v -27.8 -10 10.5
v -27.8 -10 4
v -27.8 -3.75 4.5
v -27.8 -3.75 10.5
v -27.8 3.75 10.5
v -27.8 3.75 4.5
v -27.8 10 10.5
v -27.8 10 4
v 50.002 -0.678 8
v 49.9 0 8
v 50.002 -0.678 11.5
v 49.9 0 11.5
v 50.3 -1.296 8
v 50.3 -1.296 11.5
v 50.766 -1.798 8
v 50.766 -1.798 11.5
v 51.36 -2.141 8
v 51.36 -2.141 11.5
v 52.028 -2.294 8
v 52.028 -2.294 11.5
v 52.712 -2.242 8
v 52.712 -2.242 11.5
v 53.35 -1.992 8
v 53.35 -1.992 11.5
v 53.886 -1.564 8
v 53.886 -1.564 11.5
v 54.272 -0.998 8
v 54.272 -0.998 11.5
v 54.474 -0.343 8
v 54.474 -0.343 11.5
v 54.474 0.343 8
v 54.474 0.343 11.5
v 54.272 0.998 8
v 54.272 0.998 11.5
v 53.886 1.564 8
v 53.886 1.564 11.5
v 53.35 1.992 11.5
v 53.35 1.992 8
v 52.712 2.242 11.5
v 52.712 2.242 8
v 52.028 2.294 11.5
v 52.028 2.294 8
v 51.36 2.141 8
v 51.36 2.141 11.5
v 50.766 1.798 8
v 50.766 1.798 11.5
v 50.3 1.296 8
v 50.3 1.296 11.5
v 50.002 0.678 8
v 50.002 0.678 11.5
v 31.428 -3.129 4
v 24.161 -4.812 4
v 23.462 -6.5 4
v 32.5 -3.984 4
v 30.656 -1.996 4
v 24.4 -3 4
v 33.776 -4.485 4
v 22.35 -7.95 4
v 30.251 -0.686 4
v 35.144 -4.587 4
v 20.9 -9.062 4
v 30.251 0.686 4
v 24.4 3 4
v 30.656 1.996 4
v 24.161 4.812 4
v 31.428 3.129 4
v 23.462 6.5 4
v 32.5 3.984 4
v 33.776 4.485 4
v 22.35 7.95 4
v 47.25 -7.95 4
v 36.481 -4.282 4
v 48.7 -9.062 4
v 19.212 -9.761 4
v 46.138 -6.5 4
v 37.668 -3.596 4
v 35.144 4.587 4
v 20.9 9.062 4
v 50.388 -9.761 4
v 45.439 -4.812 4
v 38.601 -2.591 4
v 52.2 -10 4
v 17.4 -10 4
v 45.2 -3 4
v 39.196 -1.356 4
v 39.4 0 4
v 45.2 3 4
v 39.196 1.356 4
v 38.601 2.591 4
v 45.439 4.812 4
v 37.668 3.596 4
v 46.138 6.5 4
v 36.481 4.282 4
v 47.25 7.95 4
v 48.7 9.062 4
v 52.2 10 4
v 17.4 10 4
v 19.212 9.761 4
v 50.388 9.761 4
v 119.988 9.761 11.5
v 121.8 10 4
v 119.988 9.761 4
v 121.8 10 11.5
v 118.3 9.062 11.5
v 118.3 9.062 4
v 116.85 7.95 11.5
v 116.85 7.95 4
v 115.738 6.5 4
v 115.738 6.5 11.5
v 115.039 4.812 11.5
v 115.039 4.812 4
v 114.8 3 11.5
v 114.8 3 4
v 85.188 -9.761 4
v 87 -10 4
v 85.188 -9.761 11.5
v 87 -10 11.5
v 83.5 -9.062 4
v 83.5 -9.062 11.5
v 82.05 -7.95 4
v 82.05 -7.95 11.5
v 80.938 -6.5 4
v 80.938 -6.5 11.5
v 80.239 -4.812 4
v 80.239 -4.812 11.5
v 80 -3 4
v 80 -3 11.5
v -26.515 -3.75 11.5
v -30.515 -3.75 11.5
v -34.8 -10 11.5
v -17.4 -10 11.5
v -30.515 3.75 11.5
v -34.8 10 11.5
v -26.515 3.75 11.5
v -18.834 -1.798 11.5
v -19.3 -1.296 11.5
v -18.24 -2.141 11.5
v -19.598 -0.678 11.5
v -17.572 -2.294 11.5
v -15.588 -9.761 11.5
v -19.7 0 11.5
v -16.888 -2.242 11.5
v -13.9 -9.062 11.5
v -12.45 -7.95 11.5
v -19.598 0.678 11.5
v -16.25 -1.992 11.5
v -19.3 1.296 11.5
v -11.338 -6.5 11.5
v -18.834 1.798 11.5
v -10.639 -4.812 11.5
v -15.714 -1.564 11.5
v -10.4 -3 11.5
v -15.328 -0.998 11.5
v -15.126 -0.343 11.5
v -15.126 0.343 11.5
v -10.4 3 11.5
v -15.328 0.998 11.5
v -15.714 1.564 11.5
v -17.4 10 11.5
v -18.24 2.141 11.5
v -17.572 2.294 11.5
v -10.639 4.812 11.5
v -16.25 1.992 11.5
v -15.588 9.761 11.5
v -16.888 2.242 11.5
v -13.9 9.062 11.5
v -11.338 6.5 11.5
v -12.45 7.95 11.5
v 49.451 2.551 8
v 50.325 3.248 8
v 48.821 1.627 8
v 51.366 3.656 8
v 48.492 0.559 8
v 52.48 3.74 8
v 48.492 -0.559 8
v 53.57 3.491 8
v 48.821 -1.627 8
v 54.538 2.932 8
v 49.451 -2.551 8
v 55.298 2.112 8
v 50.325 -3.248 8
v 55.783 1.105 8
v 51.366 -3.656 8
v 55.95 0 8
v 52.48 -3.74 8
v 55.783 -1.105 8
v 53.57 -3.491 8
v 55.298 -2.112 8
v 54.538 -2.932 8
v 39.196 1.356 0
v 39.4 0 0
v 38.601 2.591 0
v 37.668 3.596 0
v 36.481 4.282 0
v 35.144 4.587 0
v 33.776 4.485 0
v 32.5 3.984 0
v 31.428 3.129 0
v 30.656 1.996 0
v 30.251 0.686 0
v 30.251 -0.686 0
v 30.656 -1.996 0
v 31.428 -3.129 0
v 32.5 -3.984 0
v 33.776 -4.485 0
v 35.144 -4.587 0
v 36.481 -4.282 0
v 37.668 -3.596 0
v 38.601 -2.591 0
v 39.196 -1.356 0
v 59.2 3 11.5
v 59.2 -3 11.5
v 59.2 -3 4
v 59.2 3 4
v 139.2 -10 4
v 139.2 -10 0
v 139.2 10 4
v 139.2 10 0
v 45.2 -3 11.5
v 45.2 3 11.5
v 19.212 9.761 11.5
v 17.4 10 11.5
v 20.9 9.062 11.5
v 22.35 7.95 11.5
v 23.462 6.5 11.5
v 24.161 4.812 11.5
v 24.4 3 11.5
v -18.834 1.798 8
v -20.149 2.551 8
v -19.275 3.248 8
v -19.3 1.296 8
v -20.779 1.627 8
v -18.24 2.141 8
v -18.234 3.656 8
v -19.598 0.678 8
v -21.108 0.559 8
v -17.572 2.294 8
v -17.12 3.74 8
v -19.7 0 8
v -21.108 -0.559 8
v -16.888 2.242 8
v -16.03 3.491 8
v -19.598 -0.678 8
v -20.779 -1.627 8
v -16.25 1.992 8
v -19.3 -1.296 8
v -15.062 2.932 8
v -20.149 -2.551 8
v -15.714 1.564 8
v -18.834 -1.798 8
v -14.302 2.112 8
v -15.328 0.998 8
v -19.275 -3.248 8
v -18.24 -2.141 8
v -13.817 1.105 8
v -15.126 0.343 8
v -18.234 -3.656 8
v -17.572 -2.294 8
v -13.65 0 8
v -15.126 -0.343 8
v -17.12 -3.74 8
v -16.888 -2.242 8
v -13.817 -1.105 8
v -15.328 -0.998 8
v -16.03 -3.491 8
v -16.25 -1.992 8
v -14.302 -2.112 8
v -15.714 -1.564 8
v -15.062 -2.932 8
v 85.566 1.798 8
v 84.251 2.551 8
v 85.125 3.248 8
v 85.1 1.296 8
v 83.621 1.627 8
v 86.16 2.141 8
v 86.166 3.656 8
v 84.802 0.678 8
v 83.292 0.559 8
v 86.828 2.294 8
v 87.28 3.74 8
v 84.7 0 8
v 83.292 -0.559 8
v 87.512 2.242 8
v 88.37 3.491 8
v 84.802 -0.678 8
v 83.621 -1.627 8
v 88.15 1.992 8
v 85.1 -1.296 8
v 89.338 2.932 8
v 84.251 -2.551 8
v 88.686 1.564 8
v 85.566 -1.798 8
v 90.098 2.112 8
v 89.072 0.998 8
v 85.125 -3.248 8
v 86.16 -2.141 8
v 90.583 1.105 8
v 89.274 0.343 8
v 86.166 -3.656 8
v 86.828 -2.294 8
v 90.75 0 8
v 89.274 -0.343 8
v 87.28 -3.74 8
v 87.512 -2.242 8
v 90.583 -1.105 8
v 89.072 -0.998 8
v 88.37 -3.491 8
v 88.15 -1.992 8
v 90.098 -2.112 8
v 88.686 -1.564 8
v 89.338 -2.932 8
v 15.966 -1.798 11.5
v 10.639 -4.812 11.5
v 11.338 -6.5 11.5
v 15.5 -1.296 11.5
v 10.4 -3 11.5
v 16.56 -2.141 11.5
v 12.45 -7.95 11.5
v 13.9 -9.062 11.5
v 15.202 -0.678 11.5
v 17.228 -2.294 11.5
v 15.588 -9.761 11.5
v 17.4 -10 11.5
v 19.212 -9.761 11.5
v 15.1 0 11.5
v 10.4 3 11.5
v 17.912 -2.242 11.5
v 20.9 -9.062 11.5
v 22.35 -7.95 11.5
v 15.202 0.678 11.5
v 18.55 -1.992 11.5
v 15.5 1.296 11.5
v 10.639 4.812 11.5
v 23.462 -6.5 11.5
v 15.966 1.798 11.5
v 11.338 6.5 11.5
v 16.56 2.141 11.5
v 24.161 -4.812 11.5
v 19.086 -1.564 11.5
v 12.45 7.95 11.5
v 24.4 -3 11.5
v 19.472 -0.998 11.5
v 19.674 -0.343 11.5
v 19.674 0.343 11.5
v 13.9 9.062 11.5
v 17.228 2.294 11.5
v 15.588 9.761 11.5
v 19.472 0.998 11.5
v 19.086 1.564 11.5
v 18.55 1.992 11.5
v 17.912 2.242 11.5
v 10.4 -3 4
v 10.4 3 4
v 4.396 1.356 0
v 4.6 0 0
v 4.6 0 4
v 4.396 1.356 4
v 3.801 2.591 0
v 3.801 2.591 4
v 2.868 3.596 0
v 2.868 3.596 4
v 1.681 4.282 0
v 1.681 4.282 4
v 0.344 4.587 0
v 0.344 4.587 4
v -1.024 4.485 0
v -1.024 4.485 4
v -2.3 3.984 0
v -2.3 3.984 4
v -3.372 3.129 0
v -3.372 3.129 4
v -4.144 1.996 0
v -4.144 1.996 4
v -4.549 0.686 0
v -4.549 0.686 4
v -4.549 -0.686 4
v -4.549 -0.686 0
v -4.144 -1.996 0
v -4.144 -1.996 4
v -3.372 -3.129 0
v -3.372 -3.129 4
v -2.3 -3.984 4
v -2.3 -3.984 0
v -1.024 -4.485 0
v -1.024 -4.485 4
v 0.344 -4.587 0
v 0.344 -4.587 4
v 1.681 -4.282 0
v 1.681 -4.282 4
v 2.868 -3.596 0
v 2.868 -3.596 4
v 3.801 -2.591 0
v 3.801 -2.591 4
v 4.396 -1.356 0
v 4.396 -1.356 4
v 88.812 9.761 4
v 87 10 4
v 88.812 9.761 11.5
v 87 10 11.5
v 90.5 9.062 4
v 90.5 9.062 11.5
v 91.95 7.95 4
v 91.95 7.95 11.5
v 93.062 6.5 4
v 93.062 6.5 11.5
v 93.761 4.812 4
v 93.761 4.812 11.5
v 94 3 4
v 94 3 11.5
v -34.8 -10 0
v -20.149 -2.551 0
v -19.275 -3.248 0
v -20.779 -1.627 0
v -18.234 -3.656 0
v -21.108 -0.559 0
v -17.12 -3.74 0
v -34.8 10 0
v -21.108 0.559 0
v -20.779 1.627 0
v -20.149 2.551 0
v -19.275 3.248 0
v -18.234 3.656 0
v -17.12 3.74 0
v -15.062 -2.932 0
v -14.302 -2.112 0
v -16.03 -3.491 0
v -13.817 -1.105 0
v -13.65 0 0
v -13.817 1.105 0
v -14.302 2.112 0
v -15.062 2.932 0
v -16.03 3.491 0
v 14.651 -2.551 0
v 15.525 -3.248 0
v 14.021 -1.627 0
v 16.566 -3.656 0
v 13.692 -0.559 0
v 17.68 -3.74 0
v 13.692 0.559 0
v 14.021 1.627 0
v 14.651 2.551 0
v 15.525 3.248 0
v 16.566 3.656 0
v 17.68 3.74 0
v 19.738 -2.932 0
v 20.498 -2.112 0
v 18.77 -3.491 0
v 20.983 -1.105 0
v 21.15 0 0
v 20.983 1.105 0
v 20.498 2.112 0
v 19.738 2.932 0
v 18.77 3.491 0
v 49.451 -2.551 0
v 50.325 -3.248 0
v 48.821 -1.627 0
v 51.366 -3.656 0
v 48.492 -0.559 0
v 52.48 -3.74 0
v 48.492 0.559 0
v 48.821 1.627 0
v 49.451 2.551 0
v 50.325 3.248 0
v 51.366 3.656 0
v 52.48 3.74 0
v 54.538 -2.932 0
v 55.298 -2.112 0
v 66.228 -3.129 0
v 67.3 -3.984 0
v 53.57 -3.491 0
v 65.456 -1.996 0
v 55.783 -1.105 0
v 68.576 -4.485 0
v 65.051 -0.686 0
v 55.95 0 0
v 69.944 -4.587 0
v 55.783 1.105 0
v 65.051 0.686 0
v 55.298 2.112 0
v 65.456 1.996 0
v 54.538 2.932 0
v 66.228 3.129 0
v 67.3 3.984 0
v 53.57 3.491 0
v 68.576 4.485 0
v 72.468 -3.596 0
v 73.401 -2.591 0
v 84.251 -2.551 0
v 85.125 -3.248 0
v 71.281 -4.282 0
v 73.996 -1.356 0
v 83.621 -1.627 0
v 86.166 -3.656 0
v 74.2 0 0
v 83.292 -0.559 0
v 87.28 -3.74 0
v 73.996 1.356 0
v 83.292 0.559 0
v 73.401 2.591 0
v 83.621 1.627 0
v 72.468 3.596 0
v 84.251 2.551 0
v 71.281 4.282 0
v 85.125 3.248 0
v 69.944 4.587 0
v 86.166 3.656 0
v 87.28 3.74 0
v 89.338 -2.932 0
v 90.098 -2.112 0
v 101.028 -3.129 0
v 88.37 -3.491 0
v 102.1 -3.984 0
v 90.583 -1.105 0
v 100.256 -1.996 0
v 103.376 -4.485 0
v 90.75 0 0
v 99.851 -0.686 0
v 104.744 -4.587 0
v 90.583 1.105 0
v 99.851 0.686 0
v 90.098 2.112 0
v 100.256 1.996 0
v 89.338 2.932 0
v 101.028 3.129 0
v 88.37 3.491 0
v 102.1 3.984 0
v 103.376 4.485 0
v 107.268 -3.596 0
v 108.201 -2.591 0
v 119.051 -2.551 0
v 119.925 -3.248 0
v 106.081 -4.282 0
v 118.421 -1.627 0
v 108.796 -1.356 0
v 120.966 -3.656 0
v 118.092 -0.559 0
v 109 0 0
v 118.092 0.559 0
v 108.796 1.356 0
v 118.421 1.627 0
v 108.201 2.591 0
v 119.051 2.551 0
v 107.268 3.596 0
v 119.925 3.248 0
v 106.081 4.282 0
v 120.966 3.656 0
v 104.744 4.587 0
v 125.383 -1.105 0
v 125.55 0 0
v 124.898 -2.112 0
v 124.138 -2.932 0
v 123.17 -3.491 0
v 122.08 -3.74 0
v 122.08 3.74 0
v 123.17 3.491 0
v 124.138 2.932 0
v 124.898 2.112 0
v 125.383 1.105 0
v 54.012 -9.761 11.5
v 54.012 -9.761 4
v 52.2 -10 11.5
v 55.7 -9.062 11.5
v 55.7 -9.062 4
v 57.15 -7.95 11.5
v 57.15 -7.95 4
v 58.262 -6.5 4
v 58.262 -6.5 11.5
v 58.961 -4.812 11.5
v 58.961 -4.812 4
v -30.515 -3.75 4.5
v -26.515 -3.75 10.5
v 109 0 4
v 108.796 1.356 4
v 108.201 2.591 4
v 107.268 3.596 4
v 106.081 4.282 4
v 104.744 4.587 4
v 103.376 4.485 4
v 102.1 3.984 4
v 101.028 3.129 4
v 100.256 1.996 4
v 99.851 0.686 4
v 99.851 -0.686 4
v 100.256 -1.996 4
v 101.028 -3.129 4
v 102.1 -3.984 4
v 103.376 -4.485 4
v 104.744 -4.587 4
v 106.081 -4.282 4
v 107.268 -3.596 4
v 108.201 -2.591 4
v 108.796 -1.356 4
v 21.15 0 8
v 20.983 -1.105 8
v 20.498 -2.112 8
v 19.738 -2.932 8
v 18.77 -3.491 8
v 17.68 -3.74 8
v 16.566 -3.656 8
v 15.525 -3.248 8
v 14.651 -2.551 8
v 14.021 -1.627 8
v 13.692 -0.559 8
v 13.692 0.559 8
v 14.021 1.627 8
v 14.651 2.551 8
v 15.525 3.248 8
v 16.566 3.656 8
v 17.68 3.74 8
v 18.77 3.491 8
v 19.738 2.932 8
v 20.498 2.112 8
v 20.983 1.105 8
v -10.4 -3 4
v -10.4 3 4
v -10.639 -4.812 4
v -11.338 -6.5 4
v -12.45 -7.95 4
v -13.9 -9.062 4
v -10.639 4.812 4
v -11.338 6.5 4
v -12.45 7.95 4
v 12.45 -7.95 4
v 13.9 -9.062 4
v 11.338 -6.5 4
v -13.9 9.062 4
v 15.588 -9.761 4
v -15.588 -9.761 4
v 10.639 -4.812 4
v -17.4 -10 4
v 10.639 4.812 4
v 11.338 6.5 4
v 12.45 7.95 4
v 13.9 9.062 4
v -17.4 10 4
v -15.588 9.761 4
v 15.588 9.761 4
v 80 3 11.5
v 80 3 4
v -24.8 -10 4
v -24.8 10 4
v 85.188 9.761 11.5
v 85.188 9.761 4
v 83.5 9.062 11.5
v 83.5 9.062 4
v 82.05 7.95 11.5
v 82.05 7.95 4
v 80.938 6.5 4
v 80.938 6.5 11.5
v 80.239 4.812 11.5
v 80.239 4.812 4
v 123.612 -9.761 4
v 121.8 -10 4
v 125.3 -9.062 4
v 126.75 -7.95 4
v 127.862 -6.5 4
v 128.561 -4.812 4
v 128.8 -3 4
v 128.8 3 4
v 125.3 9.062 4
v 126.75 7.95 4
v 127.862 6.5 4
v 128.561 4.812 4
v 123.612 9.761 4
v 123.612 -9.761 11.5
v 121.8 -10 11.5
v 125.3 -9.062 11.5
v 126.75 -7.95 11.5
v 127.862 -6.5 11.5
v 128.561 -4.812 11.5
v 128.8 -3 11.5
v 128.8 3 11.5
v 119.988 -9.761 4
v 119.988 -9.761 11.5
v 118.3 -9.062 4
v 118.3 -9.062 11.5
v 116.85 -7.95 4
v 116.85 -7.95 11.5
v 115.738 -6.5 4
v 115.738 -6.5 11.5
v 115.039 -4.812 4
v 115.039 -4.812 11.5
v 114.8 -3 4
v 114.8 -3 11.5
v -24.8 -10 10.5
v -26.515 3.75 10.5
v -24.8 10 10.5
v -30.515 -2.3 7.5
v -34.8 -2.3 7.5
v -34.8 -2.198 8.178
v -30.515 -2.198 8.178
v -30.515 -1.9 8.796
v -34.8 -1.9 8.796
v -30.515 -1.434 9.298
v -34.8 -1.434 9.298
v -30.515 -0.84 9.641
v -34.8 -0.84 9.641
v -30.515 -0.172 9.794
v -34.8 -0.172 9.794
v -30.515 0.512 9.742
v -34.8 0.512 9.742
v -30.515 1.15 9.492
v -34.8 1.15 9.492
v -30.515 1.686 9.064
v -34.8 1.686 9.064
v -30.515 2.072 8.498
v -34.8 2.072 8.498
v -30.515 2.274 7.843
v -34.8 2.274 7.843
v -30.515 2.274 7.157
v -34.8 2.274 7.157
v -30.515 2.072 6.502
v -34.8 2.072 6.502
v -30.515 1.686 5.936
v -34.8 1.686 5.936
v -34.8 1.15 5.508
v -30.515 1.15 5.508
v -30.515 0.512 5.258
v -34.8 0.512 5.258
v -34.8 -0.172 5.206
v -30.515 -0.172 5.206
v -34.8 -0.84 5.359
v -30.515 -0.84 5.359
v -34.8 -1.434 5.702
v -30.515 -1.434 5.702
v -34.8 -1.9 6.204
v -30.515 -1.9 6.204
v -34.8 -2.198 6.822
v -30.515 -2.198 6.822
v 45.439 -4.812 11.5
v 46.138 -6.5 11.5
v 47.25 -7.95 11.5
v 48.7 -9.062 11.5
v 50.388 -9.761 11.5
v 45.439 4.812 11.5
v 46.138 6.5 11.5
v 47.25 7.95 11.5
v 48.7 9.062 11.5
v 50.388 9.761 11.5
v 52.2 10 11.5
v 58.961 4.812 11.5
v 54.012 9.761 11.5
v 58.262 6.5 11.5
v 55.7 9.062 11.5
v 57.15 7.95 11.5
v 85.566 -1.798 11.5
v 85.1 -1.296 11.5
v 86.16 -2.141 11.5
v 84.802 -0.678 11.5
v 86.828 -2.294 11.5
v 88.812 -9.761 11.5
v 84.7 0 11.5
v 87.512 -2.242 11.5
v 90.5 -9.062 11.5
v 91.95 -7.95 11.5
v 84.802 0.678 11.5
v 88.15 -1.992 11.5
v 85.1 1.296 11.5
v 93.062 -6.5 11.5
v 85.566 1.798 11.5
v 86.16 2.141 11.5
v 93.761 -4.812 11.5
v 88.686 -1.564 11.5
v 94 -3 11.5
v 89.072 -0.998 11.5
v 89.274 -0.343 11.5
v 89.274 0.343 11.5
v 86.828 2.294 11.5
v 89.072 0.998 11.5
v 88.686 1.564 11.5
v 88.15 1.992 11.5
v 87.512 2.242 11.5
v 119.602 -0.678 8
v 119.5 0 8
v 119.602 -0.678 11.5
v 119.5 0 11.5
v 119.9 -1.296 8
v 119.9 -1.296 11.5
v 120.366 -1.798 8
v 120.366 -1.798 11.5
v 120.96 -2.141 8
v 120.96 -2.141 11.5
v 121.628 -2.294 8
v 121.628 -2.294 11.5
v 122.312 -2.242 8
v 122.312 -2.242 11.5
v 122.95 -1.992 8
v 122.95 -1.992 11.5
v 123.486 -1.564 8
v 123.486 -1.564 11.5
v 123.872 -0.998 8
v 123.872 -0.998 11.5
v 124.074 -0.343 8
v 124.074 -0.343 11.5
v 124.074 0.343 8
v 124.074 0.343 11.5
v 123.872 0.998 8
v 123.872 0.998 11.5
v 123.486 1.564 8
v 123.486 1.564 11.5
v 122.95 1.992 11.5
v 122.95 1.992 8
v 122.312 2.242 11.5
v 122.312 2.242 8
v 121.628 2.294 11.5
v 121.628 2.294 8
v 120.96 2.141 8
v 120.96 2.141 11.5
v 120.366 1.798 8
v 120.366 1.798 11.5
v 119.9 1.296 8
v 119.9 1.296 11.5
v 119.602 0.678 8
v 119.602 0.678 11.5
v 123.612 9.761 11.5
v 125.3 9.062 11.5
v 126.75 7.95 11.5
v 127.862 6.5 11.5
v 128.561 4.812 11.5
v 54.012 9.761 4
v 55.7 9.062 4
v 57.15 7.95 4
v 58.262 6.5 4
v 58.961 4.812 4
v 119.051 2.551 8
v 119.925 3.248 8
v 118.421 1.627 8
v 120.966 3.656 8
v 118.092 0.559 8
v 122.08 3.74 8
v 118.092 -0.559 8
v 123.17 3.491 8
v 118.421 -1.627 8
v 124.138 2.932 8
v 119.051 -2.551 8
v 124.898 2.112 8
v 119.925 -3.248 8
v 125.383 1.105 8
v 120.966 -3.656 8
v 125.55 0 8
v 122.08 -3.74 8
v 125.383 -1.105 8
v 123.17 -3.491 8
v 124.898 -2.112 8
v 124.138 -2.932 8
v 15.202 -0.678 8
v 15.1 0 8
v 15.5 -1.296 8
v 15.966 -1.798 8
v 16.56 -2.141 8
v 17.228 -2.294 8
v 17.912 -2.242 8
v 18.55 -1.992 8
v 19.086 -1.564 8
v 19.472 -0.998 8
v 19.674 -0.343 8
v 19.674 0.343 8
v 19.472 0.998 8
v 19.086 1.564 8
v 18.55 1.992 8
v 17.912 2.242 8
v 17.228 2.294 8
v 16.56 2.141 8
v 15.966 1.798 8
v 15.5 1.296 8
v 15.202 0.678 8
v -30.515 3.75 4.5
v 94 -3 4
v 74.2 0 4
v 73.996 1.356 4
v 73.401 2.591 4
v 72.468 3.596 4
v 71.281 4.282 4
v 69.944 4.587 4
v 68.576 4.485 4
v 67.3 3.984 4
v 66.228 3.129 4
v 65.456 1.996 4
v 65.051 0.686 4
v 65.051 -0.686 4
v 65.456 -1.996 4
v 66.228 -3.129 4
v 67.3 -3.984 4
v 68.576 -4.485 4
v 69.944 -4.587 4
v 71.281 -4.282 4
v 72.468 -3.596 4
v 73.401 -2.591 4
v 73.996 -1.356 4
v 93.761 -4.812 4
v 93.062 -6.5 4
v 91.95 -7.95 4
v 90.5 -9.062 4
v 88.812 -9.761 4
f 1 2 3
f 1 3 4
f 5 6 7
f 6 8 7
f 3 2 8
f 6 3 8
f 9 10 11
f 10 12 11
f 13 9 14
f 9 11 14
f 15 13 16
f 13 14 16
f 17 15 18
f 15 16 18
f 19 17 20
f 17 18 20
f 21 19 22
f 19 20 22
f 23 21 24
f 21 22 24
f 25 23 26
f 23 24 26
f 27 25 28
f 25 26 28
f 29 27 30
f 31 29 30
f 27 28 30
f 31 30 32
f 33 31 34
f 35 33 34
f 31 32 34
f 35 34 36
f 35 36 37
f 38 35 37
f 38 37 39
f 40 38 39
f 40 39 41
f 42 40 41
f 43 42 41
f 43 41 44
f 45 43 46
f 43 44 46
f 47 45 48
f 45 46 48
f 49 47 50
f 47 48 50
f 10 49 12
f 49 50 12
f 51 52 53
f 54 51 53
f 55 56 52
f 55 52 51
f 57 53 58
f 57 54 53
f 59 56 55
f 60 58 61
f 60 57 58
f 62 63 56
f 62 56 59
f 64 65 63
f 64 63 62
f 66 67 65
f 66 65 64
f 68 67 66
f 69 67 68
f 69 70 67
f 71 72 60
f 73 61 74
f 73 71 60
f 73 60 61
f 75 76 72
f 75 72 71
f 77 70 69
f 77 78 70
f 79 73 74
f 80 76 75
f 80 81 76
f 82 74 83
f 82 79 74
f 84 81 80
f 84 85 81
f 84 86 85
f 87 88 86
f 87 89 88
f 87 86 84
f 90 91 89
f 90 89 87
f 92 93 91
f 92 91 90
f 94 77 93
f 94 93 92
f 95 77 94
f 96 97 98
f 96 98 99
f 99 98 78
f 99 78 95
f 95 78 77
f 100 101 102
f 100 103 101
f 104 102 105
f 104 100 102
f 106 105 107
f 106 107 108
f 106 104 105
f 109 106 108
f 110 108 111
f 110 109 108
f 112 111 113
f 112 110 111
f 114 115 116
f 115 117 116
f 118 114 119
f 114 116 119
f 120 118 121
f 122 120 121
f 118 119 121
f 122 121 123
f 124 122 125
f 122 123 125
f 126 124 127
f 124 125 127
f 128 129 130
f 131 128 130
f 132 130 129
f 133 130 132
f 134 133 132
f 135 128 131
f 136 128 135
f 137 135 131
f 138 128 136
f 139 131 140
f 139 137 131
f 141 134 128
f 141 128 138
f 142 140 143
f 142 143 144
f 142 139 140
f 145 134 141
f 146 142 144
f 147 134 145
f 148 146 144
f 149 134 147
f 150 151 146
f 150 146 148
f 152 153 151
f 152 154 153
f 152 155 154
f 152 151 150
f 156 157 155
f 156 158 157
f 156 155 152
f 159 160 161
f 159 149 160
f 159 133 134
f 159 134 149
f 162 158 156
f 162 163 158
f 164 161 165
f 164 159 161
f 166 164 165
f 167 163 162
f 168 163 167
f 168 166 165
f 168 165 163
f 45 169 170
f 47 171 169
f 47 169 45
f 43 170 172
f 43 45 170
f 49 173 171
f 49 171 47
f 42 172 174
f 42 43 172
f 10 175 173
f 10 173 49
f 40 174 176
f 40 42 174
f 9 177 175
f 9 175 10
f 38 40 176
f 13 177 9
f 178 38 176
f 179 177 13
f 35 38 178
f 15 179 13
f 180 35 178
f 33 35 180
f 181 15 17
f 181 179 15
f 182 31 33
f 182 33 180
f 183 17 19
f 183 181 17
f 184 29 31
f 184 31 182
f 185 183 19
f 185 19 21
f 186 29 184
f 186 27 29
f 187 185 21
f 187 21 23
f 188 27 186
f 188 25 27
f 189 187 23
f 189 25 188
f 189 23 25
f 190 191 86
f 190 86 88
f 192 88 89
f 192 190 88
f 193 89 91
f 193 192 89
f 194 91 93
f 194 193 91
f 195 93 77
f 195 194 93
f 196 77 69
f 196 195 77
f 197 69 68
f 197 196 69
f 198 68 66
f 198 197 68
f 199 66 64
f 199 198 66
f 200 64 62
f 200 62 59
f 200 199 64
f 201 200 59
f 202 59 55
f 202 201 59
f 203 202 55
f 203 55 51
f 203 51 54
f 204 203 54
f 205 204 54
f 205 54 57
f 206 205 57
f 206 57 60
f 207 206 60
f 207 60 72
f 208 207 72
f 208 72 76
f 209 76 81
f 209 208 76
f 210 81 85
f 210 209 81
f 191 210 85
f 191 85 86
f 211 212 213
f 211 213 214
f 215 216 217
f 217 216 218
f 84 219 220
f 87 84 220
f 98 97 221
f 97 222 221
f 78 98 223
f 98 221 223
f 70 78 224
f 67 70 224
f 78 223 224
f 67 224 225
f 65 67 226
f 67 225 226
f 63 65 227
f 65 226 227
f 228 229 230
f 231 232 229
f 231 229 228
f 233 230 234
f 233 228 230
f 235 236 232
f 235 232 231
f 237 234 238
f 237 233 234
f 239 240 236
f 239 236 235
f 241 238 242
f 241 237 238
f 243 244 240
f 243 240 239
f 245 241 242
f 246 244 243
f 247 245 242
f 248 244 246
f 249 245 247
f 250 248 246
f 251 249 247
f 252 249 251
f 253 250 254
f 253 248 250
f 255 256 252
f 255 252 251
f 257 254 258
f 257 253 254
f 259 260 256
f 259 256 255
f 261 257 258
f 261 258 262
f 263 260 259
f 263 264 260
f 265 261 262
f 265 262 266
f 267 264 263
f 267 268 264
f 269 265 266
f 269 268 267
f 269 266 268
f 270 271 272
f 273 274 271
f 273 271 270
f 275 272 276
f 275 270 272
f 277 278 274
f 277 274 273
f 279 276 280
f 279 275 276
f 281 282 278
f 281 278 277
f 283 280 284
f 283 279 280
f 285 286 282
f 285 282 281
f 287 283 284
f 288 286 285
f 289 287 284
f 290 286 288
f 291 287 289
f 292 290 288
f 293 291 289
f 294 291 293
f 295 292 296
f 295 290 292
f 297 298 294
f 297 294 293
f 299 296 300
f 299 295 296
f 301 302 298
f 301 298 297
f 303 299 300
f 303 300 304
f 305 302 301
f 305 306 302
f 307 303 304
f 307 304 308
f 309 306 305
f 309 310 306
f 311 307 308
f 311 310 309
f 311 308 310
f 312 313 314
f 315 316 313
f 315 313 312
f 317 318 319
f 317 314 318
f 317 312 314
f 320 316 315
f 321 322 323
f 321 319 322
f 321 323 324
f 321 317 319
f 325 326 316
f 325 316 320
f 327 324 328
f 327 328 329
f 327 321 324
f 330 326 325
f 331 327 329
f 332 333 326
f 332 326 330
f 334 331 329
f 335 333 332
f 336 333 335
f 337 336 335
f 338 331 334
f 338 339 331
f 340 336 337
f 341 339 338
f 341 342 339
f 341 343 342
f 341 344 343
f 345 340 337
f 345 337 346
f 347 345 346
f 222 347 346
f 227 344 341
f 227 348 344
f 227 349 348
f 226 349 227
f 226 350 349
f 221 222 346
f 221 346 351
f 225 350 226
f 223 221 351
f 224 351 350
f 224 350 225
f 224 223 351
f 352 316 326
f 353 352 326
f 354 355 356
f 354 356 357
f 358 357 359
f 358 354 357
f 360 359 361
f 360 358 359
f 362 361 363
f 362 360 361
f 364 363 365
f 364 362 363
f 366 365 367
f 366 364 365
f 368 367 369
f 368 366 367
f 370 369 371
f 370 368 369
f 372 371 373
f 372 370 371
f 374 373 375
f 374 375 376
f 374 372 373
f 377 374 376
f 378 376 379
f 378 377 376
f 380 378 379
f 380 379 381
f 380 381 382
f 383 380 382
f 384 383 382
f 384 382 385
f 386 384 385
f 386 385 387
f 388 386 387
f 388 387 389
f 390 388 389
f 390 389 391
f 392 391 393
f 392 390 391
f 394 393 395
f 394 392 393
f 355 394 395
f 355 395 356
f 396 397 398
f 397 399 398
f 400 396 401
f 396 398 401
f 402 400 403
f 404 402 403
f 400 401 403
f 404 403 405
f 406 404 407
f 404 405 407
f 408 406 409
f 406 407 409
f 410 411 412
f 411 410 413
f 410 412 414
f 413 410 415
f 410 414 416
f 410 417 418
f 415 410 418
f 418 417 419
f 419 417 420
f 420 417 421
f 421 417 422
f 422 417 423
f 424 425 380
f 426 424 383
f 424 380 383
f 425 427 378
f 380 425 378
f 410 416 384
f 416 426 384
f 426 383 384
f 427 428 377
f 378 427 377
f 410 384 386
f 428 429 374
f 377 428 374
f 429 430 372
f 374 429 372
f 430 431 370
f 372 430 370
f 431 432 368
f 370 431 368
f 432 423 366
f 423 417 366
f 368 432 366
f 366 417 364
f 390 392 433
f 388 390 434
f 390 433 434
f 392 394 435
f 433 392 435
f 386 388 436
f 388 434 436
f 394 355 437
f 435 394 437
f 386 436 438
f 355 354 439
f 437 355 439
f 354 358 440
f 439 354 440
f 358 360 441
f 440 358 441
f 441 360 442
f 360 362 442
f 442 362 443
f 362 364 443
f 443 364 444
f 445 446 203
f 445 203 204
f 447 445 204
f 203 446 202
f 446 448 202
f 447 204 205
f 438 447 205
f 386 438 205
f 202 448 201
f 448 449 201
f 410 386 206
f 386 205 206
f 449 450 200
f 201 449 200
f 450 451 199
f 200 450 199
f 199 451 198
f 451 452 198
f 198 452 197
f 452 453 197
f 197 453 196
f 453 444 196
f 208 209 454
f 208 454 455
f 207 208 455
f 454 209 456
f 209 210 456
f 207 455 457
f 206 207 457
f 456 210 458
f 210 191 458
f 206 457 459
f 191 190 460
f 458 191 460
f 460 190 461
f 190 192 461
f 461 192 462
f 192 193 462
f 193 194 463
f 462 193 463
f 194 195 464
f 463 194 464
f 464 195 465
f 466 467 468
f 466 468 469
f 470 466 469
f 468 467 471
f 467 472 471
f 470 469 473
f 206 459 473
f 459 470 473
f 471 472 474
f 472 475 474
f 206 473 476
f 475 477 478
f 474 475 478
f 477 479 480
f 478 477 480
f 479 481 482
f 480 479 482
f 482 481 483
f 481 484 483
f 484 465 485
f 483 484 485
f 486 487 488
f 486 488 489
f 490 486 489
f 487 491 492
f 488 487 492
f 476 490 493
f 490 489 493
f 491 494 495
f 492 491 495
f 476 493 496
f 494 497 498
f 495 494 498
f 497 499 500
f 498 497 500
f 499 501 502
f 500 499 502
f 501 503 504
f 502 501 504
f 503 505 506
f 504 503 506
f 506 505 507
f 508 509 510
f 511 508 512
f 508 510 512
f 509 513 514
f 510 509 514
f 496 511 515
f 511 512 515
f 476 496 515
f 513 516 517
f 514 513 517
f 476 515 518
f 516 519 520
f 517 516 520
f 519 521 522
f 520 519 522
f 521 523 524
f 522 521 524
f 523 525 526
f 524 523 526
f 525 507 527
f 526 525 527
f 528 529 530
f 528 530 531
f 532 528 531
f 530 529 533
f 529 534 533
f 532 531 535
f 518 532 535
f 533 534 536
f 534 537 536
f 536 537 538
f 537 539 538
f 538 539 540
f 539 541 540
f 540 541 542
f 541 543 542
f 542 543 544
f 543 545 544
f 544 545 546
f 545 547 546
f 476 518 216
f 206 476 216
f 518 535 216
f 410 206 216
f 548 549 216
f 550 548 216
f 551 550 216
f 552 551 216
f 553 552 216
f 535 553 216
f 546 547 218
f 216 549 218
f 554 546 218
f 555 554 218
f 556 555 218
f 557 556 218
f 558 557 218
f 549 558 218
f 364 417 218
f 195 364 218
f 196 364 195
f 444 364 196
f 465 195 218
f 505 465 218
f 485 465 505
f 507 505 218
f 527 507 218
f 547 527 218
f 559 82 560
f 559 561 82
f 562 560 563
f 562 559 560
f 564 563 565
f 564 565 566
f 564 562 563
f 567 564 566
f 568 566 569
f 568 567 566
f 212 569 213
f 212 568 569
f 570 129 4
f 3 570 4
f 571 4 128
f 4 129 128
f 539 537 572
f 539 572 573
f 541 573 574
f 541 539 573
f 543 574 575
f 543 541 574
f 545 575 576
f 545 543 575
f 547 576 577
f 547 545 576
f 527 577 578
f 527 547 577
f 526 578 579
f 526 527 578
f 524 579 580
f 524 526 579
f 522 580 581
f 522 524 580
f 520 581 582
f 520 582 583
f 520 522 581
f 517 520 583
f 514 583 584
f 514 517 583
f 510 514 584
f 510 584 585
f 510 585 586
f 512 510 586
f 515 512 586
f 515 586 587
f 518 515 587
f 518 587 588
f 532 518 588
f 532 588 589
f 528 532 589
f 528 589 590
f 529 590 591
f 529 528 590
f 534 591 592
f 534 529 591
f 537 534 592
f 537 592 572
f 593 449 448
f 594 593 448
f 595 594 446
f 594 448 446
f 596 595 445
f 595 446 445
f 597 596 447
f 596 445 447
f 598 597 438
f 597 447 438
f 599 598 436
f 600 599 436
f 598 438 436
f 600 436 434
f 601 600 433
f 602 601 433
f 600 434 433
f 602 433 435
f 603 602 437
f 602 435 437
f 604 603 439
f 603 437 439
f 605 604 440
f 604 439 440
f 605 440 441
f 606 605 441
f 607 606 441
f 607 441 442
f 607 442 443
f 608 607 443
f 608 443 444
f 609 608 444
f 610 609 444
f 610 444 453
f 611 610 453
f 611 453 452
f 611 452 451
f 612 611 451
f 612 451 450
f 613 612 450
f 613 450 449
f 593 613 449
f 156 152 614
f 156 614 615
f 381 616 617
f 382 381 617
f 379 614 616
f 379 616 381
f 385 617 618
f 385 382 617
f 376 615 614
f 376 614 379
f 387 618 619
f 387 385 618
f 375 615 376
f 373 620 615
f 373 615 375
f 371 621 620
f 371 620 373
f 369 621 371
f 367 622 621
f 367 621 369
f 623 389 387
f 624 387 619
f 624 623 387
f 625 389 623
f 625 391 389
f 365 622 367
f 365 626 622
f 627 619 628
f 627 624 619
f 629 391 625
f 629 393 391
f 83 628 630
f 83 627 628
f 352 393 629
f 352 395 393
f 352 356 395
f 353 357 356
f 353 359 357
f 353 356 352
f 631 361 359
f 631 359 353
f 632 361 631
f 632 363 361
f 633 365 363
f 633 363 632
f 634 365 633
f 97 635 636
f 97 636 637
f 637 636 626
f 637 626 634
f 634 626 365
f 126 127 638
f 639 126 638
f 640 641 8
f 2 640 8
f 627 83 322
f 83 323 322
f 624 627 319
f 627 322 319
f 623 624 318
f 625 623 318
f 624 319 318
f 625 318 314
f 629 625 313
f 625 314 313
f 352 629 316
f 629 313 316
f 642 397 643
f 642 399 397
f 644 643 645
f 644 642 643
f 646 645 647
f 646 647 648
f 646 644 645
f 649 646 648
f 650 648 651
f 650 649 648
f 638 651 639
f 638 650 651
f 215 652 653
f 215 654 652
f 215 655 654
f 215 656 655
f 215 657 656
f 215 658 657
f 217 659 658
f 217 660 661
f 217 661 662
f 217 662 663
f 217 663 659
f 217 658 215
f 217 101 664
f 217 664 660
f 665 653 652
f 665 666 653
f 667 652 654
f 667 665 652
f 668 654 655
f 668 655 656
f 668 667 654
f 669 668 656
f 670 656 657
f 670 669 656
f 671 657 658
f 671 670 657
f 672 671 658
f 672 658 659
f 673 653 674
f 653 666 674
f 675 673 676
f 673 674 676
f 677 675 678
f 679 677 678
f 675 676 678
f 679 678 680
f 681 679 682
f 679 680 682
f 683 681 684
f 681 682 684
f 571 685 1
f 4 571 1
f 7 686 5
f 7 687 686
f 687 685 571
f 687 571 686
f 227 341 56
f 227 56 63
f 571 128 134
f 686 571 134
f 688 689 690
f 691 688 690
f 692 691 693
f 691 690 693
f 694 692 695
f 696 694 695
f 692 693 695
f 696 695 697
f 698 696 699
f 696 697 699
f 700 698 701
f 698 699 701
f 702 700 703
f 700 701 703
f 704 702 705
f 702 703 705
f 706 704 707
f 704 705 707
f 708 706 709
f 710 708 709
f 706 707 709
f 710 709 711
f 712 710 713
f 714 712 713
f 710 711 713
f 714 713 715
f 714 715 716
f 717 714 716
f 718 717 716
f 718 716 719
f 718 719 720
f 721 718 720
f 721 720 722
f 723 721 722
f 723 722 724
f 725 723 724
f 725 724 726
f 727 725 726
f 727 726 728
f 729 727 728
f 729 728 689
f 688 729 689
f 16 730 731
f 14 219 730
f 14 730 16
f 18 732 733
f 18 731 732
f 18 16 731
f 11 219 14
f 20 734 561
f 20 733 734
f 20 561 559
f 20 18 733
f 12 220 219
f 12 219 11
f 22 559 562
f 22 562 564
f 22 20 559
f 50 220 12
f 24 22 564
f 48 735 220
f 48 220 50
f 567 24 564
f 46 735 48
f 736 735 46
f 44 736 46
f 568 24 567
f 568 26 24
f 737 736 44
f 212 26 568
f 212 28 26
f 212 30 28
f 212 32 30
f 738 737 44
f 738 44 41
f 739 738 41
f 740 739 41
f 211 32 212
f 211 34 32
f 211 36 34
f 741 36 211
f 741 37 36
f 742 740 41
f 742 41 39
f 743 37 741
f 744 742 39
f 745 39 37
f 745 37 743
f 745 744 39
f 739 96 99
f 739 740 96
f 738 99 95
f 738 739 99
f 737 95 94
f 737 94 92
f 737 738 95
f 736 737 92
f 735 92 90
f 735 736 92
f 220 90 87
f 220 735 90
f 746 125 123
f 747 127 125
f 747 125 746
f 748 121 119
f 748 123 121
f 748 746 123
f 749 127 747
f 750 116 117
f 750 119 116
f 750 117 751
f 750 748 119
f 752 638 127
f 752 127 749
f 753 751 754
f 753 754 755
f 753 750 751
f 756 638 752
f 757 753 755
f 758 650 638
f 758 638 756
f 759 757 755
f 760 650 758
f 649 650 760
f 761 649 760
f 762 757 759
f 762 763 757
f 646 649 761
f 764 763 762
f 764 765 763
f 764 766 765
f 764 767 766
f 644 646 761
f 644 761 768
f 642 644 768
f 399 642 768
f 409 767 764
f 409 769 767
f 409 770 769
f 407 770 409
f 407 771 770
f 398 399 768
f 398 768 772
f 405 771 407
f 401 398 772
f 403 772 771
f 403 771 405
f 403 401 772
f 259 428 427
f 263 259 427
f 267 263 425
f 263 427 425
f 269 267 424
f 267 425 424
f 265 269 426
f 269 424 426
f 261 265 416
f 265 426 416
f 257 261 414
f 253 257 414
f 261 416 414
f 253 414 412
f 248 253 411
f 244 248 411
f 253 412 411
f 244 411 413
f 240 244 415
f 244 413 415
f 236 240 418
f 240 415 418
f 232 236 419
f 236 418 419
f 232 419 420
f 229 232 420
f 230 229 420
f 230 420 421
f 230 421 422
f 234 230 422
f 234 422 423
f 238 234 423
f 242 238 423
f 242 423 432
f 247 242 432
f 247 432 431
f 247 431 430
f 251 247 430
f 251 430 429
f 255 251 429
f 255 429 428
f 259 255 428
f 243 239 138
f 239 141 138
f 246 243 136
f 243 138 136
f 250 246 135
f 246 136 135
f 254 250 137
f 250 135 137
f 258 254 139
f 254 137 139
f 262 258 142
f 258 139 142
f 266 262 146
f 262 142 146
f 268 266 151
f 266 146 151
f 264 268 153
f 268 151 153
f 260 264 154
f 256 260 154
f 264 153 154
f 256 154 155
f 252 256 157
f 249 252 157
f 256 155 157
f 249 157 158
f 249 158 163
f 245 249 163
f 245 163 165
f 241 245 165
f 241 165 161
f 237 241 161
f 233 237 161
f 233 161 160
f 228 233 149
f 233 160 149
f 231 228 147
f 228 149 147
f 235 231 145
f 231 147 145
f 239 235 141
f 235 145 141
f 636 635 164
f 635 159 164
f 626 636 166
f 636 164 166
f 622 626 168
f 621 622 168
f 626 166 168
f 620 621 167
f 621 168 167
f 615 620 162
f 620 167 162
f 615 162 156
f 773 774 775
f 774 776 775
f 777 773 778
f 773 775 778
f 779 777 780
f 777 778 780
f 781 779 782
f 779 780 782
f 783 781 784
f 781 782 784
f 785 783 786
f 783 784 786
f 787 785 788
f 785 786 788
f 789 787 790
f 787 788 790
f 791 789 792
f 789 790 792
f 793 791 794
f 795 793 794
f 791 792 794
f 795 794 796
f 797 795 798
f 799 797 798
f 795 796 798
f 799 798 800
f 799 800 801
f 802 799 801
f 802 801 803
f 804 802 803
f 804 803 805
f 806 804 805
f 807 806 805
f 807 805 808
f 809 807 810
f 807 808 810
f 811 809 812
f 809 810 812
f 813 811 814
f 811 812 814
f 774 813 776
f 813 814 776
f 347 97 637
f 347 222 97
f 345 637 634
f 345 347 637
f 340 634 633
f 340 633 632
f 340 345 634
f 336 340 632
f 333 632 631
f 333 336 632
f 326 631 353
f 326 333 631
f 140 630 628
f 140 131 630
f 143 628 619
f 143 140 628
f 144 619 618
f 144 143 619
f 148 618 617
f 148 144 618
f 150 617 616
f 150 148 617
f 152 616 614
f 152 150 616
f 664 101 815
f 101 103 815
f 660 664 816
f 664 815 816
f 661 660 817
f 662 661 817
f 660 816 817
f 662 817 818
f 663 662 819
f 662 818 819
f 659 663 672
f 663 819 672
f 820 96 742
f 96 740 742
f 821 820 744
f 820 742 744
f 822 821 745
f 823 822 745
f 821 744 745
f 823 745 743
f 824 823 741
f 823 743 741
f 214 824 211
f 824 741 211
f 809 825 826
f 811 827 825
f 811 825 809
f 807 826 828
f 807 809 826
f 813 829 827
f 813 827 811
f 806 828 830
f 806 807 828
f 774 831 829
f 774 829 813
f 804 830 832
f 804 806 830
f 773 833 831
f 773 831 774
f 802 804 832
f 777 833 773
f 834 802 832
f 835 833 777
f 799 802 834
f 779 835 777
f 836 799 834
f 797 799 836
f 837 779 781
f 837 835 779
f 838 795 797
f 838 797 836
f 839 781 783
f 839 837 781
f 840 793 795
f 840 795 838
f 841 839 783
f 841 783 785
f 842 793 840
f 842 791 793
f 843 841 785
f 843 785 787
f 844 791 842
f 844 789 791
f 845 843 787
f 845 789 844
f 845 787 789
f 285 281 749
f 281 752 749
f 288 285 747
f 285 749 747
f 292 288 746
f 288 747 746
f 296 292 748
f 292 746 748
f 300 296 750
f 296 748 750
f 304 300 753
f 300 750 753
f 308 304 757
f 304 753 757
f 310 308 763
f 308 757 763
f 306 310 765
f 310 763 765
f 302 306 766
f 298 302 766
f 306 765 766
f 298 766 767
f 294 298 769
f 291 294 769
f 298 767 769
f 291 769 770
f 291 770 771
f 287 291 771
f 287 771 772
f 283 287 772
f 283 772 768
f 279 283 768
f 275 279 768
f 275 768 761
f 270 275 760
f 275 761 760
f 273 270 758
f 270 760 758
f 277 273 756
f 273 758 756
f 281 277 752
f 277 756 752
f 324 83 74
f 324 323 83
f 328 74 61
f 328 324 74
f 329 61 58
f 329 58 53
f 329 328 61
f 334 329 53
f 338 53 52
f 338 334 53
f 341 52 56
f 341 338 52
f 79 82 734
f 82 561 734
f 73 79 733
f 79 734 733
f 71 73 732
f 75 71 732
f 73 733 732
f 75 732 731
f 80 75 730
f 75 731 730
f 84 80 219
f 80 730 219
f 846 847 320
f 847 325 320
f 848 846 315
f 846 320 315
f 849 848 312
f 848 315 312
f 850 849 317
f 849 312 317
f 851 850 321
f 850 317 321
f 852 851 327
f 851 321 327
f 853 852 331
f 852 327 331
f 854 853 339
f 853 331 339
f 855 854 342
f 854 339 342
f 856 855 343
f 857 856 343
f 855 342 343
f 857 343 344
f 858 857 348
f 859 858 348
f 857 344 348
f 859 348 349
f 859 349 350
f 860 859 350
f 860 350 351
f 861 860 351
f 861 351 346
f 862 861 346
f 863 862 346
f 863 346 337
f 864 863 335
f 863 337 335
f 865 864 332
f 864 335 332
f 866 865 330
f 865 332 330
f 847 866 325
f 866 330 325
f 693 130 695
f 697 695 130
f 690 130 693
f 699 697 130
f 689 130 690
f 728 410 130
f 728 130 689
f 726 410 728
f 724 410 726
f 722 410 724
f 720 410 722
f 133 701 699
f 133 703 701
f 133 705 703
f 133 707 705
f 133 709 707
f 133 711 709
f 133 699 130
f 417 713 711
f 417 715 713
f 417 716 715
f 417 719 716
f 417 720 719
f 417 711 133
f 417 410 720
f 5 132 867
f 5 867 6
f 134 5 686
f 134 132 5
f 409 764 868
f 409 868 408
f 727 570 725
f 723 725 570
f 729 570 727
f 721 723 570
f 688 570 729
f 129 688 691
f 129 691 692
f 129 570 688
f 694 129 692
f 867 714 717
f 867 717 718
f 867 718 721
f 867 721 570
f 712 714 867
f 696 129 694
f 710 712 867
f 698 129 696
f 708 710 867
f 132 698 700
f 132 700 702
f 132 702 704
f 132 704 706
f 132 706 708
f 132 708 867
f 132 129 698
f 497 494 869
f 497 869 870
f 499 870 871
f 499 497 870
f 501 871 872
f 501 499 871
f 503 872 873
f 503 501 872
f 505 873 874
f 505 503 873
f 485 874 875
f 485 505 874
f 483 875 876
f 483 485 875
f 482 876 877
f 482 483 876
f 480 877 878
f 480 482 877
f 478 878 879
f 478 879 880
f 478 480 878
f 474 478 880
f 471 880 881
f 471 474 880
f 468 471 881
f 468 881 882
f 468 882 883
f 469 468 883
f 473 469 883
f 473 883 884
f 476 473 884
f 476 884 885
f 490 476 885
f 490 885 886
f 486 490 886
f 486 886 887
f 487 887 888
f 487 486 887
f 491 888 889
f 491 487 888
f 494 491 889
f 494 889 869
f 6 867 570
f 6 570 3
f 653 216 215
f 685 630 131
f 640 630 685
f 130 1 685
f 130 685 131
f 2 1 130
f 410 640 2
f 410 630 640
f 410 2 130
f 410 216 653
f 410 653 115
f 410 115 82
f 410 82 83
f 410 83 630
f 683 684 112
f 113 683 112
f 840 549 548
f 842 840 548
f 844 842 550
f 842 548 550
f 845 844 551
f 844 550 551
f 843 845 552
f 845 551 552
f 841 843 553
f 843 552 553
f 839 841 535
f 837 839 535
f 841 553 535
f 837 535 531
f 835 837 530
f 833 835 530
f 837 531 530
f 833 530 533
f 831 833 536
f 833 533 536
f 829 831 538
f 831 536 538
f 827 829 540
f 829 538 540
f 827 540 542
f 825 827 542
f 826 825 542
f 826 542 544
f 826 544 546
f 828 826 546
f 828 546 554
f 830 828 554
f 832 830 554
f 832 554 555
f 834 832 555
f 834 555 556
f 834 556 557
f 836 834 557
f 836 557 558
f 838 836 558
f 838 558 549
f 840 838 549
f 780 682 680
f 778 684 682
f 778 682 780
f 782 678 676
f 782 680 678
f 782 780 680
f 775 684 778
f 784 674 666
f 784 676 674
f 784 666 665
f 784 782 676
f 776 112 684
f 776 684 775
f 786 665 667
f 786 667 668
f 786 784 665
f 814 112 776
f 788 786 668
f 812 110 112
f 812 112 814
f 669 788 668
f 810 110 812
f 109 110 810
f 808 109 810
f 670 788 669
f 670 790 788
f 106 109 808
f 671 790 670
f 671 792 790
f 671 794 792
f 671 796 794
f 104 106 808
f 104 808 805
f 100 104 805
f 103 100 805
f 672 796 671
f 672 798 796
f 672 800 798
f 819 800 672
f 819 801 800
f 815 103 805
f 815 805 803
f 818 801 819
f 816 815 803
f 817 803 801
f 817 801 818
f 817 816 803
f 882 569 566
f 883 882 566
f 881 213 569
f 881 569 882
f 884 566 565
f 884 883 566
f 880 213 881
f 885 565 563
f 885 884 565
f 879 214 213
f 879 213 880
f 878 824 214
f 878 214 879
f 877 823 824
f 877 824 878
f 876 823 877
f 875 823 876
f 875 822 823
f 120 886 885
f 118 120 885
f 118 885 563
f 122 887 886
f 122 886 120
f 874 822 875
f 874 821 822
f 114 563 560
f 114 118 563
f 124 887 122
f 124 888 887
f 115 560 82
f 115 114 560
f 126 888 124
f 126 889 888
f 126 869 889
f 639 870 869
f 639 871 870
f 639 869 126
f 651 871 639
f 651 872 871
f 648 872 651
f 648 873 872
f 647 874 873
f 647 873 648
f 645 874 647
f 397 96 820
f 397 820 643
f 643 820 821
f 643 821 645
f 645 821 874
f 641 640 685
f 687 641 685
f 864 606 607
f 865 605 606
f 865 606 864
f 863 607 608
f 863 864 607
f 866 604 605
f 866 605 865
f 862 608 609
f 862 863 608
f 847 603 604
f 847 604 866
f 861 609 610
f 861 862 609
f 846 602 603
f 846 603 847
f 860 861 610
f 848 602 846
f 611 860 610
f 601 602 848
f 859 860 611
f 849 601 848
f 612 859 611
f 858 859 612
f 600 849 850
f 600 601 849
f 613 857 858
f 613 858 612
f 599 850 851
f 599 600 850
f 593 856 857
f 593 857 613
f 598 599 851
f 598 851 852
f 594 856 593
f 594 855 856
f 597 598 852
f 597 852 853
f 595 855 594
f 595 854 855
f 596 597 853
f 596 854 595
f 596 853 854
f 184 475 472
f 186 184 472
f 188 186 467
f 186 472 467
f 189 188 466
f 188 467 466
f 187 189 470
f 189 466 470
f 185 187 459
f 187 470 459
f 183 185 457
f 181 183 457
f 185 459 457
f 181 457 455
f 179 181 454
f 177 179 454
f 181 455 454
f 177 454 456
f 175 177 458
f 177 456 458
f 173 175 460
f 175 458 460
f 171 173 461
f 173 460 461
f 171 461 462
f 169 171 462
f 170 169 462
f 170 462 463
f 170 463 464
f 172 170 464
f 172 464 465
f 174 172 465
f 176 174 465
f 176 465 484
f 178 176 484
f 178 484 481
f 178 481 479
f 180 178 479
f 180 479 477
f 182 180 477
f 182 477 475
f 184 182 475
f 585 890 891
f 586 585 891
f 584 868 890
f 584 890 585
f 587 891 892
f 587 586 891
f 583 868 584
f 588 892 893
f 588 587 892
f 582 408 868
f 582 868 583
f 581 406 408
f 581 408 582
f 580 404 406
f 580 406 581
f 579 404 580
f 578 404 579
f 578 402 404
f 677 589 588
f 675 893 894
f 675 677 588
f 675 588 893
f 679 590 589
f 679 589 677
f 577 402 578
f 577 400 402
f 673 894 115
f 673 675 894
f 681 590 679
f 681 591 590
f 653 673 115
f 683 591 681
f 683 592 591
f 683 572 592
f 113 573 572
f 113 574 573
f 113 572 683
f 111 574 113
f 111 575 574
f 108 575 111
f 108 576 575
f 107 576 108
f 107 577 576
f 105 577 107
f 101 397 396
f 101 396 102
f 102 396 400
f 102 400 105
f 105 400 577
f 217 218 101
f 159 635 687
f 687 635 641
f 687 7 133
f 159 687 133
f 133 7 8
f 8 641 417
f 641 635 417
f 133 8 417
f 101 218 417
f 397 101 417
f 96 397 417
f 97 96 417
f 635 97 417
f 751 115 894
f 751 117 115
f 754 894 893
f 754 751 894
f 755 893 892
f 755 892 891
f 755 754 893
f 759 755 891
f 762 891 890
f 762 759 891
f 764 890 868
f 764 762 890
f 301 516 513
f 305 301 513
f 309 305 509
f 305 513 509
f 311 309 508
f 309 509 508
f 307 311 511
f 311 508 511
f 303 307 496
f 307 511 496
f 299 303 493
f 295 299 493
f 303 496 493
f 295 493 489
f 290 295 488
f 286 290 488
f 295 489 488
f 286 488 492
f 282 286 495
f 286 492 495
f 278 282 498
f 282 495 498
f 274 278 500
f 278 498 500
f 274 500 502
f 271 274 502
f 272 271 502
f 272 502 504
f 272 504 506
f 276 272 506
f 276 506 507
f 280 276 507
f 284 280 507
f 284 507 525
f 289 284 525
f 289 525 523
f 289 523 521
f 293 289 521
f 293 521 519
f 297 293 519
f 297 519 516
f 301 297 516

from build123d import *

# Parameters (mm, degrees)
F0_W           = 174
F0_H           = 20
F0_R           = 4.6
F1_DEPTH       = 4
F2_W           = 14
F2_H           = 20
F3_DEPTH       = 7.5
F5_D           = 4.6
F5_CBORE_D     = 7.5
F5_CBORE_DEPTH = 8
F6_R           = 6.99999
F7_DEPTH       = 7.5
F8_W           = 3
F8_H           = 6.5
F9_DEPTH       = 25
F10_W          = 4
F10_H          = 7.5
F11_DEPTH      = 7
F12_R          = 2.3
F13_DEPTH      = 10


# Not quite as in the source:
# - a fillet or chamfer is up to 0.001 mm smaller than in the source, because OpenCascade refuses the exact size


with BuildPart() as f1:
    # F0 (on Top) → F1 (new body)
    with BuildSketch(Plane.XY):
        with Locations((52.2, 0)):
            Rectangle(F0_W, F0_H)
        Circle(F0_R, mode=Mode.SUBTRACT)
        with Locations((34.8, 0)):
            Circle(F0_R, mode=Mode.SUBTRACT)
        with Locations((69.6, 0)):
            Circle(F0_R, mode=Mode.SUBTRACT)
        with Locations((104.4, 0)):
            Circle(F0_R, mode=Mode.SUBTRACT)
    extrude(amount=F1_DEPTH)

    # F2 (on face) → F3 (join)
    with BuildSketch(Plane.XY.offset(4)):
        with Locations((-17.4, 0)):
            Rectangle(F2_W, F2_H)
        with Locations((17.4, 0)):
            Rectangle(F2_W, F2_H)
        with Locations((52.2, 0)):
            Rectangle(F2_W, F2_H)
        with Locations((87, 0)):
            Rectangle(F2_W, F2_H)
        with Locations((121.8, 0)):
            Rectangle(F2_W, F2_H)
    extrude(amount=F3_DEPTH)

    # F5 (through all)
    with Locations(Plane(origin=(0, 0, 0), x_dir=(1, 0, 0), z_dir=(0, 0, -1))):
        with Locations((-17.4, 0), (17.4, 0), (52.2, 0), (87, 0), (121.8, 0)):
            CounterBoreHole(F5_D / 2, F5_CBORE_D / 2, F5_CBORE_DEPTH)

    # F6 (radius 7 in the source; OpenCascade refuses exactly that, so slightly less here)
    f6_edges = [f1.edges().sort_by_distance(p)[0] for p in [
        (-10.4, 10, 7.75),
        (10.4, 10, 7.75),
        (24.4, 10, 7.75),
        (45.2, 10, 7.75),
        (59.2, 10, 7.75),
        (80, 10, 7.75),
        (94, 10, 7.75),
        (128.8, 10, 7.75),
        (114.8, 10, 7.75),
        (-24.4, 10, 7.75),
        (-24.4, -10, 7.75),
        (-10.4, -10, 7.75),
        (10.4, -10, 7.75),
        (24.4, -10, 7.75),
        (45.2, -10, 7.75),
        (59.2, -10, 7.75),
        (80, -10, 7.75),
        (94, -10, 7.75),
        (114.8, -10, 7.75),
        (128.8, -10, 7.75),
    ]]
    fillet(f6_edges, radius=F6_R)

    # F7 (add): a face of the model
    f7_faces = [f1.faces().sort_by_distance(p)[0] for p in [
        (-28.9789302808, 0, 4),
    ]]
    extrude(f7_faces, amount=F7_DEPTH)

    # F8 (on face) → F9 (cut)
    with BuildSketch(Plane(origin=(0, 10, 0), x_dir=(-1, 0, 0), z_dir=(0, 1, 0))):
        with Locations((26.3, 7.25)):
            Rectangle(F8_W, F8_H)
    extrude(amount=-F9_DEPTH, mode=Mode.SUBTRACT)

    # F10 (on face) → F11 (cut)
    with BuildSketch(Plane.XY.offset(11.5)):
        with Locations((-28.5152019933, 0)):
            Rectangle(F10_W, F10_H)
    extrude(amount=-F11_DEPTH, mode=Mode.SUBTRACT)

    # F12 (on face) → F13 (cut)
    with BuildSketch(Plane(origin=(-34.8, 0, 0), x_dir=(0, -1, 0), z_dir=(-1, 0, 0))):
        with Locations((0, 7.5)):
            Circle(F12_R)
    extrude(amount=-F13_DEPTH, mode=Mode.SUBTRACT)


solid = f1.part
